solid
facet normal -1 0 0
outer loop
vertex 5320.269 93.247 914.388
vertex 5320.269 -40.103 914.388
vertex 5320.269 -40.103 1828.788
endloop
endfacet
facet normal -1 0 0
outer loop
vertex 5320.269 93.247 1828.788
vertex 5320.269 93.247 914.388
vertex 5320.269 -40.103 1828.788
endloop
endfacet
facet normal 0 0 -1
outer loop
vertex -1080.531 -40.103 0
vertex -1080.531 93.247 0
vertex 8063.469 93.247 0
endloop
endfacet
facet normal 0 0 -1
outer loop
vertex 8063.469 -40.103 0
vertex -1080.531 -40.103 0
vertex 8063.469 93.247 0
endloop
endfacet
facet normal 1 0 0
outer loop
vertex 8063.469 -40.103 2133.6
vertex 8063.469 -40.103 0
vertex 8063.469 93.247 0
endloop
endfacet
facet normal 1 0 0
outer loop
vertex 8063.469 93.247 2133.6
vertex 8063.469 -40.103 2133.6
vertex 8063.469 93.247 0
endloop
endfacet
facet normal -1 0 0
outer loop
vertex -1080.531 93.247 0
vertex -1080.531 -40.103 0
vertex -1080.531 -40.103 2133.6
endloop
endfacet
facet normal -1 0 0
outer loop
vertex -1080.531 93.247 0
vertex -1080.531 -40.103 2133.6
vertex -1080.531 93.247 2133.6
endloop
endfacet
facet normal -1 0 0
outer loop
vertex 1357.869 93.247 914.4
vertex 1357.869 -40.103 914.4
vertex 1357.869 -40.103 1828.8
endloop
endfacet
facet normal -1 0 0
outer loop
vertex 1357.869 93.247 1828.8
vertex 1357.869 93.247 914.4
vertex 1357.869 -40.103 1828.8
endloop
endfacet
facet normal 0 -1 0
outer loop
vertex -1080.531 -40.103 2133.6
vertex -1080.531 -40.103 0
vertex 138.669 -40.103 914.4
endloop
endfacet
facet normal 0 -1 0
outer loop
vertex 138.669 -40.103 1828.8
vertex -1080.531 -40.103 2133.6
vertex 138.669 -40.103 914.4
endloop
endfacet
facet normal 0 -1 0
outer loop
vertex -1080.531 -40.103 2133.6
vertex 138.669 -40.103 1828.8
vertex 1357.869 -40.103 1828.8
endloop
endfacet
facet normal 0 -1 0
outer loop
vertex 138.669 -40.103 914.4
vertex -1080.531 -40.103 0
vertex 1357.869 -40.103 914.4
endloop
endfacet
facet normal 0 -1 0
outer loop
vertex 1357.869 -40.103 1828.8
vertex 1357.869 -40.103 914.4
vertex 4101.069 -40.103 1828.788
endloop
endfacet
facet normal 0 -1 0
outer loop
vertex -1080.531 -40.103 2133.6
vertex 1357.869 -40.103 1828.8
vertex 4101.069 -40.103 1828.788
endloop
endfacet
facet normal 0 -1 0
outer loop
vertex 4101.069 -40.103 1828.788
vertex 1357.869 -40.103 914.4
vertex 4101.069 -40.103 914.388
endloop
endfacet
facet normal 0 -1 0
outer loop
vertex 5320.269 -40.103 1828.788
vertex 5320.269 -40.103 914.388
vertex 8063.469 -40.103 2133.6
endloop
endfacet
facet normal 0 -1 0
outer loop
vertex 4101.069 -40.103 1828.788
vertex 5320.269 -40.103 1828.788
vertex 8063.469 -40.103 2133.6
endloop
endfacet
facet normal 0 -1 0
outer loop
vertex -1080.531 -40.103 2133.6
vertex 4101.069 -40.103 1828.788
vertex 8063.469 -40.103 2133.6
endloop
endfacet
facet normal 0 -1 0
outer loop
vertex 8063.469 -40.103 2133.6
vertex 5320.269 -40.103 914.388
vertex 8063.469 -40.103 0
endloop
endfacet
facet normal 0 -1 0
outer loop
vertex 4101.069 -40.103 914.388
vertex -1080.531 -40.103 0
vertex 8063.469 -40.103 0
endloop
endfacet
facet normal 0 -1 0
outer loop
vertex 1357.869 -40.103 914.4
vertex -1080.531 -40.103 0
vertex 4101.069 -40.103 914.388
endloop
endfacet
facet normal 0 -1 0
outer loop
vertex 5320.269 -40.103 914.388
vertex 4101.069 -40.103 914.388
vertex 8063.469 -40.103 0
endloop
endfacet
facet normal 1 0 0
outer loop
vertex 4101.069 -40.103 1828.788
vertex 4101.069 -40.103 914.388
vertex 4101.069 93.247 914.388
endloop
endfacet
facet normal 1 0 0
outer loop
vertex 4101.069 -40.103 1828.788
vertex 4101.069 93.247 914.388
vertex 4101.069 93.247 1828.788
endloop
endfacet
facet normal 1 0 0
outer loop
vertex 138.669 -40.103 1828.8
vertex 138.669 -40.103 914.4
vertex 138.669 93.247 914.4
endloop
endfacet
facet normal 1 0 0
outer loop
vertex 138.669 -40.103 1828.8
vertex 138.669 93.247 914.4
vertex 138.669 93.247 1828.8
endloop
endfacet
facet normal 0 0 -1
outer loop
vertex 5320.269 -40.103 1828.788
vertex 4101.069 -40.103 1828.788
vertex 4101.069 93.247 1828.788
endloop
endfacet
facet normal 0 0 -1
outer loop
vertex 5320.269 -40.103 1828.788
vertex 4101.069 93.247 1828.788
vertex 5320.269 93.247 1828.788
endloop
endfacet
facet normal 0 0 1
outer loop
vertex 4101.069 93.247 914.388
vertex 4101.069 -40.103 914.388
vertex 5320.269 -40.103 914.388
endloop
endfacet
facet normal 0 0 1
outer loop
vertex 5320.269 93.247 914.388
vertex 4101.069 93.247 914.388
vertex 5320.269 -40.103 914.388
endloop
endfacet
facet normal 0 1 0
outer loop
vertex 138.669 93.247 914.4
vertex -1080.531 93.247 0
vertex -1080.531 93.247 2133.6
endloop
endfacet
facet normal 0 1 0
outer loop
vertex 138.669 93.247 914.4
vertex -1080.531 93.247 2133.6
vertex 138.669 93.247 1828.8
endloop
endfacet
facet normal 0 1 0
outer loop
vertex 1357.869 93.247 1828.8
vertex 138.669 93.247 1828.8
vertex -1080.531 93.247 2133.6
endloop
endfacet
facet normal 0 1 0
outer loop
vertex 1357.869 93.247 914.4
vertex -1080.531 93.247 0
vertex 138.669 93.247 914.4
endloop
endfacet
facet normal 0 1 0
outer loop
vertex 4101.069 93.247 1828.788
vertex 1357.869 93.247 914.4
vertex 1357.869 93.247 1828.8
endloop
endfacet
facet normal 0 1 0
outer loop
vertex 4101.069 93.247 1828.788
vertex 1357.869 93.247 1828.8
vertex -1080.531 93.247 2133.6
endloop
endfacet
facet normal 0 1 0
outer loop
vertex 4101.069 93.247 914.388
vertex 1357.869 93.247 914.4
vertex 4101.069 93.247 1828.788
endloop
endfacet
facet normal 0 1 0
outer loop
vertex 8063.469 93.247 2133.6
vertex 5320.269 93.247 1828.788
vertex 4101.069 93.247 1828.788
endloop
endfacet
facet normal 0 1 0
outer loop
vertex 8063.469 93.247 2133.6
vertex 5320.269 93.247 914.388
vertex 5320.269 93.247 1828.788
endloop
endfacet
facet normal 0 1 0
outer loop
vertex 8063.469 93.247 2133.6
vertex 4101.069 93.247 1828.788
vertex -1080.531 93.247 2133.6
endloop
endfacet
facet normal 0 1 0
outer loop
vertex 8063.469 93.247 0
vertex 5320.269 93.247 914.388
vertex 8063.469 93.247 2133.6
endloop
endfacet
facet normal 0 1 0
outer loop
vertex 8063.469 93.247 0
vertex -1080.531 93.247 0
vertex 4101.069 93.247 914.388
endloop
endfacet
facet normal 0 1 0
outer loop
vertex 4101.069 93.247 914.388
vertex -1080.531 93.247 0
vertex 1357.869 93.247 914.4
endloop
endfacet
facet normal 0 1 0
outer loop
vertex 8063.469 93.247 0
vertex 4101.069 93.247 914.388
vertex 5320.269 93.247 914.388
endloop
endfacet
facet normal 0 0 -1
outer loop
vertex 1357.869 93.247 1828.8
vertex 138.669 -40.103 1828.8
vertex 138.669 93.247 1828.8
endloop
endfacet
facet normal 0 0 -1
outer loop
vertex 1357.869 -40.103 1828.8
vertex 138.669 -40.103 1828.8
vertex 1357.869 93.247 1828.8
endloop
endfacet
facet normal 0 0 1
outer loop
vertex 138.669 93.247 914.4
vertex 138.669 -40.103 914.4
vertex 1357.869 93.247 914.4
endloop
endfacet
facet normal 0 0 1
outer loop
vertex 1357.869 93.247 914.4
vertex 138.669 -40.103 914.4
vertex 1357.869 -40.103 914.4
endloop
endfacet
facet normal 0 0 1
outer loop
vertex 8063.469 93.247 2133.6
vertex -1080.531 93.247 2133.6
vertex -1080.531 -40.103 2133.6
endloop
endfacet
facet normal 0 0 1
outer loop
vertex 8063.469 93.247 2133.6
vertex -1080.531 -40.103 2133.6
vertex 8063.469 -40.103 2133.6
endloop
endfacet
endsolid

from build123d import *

# Parameters (mm, degrees)
F0_W     = 9144
F0_H     = 133.35
F1_DEPTH = 2133.6
F2_W     = 1219.2
F2_H     = 914.4
F3_DEPTH = 203.2


with BuildPart() as f1:
    # F0 (on Top) → F1 (new body)
    with BuildSketch(Plane.XY):
        with Locations((3491.468594, 26.572129)):
            Rectangle(F0_W, F0_H)
    extrude(amount=F1_DEPTH)

    # F2 (on face) → F3 (cut)
    with BuildSketch(Plane.XZ.offset(40.102871)):
        with Locations((748.268594, 1371.6)):
            Rectangle(F2_W, F2_H)
        with Locations((4710.668594, 1371.588161)):
            Rectangle(F2_W, F2_H)
    extrude(amount=-F3_DEPTH, mode=Mode.SUBTRACT)


solid = f1.part
